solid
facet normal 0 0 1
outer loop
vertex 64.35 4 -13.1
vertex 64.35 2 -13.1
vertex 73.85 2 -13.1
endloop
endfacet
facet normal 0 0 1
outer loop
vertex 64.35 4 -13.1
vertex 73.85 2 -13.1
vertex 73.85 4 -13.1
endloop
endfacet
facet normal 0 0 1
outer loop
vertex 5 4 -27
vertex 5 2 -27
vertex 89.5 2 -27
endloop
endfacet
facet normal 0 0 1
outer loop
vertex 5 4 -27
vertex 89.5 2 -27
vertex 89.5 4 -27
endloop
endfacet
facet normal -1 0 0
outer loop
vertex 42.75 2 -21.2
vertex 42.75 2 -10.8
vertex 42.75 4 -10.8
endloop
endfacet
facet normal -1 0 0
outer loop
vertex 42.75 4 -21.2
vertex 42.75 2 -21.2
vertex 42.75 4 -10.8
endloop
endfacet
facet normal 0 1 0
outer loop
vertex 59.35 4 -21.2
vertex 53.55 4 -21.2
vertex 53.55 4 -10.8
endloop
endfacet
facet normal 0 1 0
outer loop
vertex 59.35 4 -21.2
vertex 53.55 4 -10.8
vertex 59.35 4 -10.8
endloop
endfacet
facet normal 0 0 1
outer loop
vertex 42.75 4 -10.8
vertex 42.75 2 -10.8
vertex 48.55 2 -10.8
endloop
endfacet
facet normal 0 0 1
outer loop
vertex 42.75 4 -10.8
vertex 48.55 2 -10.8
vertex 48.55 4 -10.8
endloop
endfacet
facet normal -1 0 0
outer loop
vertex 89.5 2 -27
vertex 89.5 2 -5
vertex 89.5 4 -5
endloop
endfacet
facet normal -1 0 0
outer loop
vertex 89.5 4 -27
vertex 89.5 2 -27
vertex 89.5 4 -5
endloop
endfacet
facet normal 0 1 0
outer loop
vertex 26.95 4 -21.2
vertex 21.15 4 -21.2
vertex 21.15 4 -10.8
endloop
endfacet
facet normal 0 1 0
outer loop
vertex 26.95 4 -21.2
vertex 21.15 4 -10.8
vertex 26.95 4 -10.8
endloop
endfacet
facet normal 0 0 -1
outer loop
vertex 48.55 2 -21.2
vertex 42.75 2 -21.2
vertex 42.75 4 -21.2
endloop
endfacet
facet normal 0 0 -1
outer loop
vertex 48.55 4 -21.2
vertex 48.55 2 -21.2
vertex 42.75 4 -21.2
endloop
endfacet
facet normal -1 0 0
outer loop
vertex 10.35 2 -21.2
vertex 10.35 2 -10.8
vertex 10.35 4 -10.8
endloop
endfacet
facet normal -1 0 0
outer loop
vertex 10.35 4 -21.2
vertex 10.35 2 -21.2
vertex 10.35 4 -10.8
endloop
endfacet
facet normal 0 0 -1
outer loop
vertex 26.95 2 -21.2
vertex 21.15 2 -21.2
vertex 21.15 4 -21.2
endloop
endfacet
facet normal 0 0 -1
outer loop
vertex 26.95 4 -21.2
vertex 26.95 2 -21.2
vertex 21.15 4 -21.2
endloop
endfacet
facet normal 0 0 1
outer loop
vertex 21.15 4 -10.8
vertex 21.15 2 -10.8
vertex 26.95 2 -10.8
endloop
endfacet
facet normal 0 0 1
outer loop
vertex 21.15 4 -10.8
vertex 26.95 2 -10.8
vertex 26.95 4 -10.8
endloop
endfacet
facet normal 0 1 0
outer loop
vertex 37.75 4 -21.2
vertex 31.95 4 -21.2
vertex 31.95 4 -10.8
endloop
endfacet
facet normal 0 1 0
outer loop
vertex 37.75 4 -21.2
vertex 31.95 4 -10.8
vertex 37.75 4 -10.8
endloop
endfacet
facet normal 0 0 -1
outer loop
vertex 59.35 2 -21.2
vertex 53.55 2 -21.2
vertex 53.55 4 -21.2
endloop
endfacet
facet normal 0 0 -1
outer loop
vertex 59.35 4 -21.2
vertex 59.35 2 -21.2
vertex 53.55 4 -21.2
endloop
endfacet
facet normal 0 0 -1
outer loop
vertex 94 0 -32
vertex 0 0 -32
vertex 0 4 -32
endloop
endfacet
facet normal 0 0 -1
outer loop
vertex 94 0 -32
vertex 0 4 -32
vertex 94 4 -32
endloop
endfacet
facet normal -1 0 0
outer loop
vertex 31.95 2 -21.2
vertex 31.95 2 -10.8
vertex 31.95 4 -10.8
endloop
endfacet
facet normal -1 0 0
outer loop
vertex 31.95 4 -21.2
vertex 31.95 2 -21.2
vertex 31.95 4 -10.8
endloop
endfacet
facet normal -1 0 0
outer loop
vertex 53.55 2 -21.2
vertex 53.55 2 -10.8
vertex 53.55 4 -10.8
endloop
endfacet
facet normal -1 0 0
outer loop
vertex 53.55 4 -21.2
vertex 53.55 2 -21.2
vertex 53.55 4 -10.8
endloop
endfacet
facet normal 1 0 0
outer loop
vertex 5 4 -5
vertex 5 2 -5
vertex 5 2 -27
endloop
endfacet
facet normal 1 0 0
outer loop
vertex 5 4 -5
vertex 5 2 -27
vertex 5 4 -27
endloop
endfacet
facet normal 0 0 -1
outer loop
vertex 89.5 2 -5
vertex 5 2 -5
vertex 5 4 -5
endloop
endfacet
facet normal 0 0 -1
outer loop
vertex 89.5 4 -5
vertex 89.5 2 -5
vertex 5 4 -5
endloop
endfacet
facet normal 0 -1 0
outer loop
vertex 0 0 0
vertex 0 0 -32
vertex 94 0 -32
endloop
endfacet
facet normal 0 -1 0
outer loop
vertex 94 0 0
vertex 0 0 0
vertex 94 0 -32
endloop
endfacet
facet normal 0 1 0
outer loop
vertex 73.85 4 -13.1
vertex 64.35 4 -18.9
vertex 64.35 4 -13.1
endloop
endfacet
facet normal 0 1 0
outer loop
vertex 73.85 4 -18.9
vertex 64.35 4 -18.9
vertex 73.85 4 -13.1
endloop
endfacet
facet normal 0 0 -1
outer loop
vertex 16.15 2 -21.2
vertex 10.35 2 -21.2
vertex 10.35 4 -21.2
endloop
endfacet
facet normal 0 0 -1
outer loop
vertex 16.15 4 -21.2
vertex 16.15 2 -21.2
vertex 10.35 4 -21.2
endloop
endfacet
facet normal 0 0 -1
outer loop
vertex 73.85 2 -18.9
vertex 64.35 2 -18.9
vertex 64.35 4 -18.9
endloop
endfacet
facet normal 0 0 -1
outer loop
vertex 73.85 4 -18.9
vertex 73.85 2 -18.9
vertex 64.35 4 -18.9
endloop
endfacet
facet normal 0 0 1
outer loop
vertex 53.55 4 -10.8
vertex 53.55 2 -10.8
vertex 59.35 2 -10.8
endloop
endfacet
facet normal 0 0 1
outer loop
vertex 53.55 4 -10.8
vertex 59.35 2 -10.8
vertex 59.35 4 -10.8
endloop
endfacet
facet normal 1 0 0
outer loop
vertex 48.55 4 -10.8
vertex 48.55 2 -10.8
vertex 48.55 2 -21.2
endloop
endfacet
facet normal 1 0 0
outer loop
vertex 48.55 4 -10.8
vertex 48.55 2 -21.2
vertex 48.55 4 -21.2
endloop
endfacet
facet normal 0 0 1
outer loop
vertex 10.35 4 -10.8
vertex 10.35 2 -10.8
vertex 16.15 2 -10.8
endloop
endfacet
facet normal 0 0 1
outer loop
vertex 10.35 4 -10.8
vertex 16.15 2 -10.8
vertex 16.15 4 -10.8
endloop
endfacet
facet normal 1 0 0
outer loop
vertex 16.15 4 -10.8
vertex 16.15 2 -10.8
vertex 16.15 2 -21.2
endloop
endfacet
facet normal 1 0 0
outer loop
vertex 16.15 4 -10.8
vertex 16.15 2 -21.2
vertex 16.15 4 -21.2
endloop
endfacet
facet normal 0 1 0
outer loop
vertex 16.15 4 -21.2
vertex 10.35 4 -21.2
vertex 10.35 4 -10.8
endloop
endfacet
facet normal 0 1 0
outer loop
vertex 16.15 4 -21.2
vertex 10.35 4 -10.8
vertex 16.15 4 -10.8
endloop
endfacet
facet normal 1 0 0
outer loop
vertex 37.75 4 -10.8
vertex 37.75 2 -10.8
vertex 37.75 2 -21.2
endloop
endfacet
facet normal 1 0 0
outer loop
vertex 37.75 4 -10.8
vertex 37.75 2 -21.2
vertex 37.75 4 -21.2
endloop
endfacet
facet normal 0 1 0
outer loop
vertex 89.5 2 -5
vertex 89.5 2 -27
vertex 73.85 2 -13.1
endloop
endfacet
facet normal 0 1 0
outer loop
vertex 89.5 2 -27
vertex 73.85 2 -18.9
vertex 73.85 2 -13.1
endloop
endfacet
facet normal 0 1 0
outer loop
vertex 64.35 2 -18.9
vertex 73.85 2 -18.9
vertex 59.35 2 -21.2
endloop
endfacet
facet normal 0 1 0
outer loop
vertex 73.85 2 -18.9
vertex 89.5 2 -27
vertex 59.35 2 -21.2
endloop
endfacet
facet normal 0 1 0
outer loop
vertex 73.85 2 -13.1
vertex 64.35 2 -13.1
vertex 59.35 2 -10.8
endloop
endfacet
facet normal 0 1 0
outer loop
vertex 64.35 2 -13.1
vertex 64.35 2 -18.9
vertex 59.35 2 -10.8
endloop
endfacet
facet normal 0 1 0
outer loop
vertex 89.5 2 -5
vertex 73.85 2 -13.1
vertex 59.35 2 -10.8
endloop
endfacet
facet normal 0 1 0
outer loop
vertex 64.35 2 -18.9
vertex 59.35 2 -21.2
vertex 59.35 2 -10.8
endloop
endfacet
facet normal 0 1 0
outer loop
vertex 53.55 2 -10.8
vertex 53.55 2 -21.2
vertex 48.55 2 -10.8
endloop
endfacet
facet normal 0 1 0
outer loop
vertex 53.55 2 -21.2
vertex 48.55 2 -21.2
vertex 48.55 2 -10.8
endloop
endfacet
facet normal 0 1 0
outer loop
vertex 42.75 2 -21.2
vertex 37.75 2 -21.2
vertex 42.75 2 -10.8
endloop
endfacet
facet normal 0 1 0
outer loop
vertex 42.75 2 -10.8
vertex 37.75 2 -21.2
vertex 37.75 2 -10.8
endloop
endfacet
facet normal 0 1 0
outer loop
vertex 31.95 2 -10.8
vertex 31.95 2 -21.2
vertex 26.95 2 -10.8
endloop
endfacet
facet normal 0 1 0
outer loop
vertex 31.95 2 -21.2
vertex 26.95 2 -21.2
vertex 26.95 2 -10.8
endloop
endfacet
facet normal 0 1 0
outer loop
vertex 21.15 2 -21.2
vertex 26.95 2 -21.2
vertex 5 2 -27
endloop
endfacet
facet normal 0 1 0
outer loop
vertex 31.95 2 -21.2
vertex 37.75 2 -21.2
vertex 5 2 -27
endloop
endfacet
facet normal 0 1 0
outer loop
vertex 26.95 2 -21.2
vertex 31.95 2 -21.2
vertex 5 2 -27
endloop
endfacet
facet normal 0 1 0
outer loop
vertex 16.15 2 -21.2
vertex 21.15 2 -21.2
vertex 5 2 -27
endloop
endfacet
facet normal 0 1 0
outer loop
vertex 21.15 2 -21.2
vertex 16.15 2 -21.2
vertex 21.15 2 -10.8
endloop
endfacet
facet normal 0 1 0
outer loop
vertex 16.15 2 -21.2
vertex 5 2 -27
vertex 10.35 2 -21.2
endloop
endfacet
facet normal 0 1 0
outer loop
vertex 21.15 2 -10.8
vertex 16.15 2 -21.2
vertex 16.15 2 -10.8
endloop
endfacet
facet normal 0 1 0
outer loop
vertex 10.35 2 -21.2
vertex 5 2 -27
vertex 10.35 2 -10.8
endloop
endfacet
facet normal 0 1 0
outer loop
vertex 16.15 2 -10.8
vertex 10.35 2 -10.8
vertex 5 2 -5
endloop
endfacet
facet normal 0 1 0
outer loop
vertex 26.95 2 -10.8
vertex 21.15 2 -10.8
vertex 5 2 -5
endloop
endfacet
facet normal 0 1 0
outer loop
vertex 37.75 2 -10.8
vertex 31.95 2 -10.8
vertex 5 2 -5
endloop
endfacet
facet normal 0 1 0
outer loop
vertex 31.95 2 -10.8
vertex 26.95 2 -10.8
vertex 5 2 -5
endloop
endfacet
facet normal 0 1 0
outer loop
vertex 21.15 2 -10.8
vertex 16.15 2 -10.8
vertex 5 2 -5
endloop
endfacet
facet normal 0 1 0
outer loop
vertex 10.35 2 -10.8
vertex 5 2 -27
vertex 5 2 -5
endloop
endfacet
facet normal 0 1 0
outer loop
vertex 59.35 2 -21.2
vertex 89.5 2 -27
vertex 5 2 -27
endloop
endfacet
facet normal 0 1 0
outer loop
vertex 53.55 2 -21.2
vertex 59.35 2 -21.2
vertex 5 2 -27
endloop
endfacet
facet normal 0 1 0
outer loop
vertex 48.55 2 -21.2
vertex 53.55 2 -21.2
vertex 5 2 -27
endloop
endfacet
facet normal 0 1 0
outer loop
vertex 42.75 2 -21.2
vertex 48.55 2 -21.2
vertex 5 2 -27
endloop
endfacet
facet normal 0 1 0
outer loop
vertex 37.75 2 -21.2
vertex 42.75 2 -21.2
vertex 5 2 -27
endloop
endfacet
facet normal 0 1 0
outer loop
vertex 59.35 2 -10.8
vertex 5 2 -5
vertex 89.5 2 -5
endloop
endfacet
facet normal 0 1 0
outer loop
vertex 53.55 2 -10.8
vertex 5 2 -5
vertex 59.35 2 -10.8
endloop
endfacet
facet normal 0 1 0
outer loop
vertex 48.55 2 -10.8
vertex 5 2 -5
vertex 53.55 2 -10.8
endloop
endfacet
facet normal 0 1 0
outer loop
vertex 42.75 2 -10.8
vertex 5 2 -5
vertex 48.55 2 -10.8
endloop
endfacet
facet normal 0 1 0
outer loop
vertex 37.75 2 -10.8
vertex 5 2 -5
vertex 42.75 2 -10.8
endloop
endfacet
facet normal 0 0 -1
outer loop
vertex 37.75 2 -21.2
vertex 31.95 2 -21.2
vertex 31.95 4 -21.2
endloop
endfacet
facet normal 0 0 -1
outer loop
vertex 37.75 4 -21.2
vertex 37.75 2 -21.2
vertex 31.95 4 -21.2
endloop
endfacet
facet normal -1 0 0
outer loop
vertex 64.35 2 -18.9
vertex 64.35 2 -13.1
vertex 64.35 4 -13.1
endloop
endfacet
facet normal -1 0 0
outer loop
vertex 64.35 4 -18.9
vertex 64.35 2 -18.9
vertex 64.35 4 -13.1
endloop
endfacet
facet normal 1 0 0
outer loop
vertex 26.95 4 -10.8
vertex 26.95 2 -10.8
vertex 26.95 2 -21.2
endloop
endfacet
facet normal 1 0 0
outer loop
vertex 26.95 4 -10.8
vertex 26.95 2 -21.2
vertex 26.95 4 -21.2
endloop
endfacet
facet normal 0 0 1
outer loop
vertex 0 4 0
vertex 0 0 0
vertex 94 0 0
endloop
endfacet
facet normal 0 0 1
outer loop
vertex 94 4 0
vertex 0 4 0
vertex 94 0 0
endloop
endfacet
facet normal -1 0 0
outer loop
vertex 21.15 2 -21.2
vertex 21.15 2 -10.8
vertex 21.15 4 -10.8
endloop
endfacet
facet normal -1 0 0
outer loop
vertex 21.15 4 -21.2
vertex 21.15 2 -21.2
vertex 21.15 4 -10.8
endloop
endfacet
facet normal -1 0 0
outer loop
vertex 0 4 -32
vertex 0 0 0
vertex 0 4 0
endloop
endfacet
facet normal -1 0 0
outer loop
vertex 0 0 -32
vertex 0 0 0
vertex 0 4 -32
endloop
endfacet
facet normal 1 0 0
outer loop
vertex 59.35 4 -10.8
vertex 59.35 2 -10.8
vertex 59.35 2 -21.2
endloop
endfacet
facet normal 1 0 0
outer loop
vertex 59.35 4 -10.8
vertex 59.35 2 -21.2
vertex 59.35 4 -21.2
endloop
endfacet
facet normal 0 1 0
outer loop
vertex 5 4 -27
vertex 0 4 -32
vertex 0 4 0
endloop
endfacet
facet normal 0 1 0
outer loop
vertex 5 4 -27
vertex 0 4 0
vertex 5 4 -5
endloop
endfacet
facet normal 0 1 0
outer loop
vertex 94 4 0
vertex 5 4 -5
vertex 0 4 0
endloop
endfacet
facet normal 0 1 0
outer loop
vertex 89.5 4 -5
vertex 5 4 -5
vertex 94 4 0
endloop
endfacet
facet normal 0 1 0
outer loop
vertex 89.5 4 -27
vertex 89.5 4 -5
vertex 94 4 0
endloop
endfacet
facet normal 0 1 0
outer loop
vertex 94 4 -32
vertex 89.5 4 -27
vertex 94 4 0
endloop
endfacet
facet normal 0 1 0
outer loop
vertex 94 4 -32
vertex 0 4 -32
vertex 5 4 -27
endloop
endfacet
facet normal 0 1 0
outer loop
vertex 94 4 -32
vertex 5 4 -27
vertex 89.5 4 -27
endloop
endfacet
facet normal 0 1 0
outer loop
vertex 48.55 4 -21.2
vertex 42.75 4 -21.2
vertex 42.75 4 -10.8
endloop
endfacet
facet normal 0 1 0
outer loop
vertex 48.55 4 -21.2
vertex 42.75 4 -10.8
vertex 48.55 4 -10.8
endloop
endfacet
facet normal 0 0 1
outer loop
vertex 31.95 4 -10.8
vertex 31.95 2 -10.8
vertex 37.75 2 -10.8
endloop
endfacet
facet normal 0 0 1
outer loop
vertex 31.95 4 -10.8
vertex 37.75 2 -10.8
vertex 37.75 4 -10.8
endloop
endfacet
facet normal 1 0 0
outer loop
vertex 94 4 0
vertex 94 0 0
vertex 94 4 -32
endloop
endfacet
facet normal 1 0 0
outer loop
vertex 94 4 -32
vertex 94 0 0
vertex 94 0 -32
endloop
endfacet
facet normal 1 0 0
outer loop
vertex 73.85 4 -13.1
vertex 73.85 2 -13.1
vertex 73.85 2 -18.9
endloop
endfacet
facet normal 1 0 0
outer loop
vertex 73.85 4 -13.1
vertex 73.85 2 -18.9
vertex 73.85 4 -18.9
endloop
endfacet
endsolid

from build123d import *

# Parameters (mm, degrees)
SKETCH1_W           = 94
SKETCH1_H           = 32
BOSS_EXTRUDE1_DEPTH = 4
CAVITY1_START       = 5
CAVITY1_OUTLINE_W   = 2
CAVITY1_OUTLINE_H   = 5.8
CAVITY1_DEPTH       = 84.5
CAVITY1_START_2     = 73.85
CAVITY1_2_OUTLINE_W = 2
CAVITY1_2_OUTLINE_H = 10.4
CAVITY1_2_DEPTH     = 15.65
CAVITY1_START_3     = 59.35
CAVITY1_3_OUTLINE_W = 2
CAVITY1_3_OUTLINE_H = 2.3
CAVITY1_3_DEPTH     = 14.5
CAVITY1_4_OUTLINE_W = 2
CAVITY1_4_OUTLINE_H = 10.4
CAVITY1_4_DEPTH     = 5.35
CAVITY1_START_4     = 16.15
CAVITY1_5_OUTLINE_W = 2
CAVITY1_5_OUTLINE_H = 10.4
CAVITY1_5_DEPTH     = 5
CAVITY1_START_5     = 26.95
CAVITY1_6_OUTLINE_W = 2
CAVITY1_6_OUTLINE_H = 10.4
CAVITY1_6_DEPTH     = 5
CAVITY1_START_6     = 37.75
CAVITY1_7_OUTLINE_W = 2
CAVITY1_7_OUTLINE_H = 10.4
CAVITY1_7_DEPTH     = 5
CAVITY1_START_7     = 48.55
CAVITY1_8_OUTLINE_W = 2
CAVITY1_8_OUTLINE_H = 10.4
CAVITY1_8_DEPTH     = 5
CAVITY1_9_OUTLINE_W = 2
CAVITY1_9_OUTLINE_H = 5.8
CAVITY1_9_DEPTH     = 5


# Read off the part's stored shape, not the designer's step: Cavity1
with BuildPart() as part:
    # Sketch1 → Boss-Extrude1 (new body)
    with BuildSketch(Plane(origin=(0, 0, 0), x_dir=(1, 0, 0), z_dir=(0, 1, 0))):
        with Locations((47, 16)):
            Rectangle(SKETCH1_W, SKETCH1_H)
    extrude(amount=BOSS_EXTRUDE1_DEPTH)

    # Cavity1 outline → Cavity1 (cut)
    with BuildSketch(Plane.YZ.offset(CAVITY1_START)):
        with Locations((3, -7.9)):
            Rectangle(CAVITY1_OUTLINE_W, CAVITY1_OUTLINE_H)
        with Locations((3, -24.1)):
            Rectangle(CAVITY1_OUTLINE_W, CAVITY1_OUTLINE_H)
    extrude(amount=CAVITY1_DEPTH, mode=Mode.SUBTRACT)

    # Cavity1 2 outline → Cavity1 2 (cut)
    with BuildSketch(Plane.YZ.offset(CAVITY1_START_2)):
        with Locations((3, -16)):
            Rectangle(CAVITY1_2_OUTLINE_W, CAVITY1_2_OUTLINE_H)
    extrude(amount=CAVITY1_2_DEPTH, mode=Mode.SUBTRACT)

    # Cavity1 3 outline → Cavity1 3 (cut)
    with BuildSketch(Plane.YZ.offset(CAVITY1_START_3)):
        with Locations((3, -11.95)):
            Rectangle(CAVITY1_3_OUTLINE_W, CAVITY1_3_OUTLINE_H)
        with Locations((3, -20.05)):
            Rectangle(CAVITY1_3_OUTLINE_W, CAVITY1_3_OUTLINE_H)
    extrude(amount=CAVITY1_3_DEPTH, mode=Mode.SUBTRACT)

    # Cavity1 4 outline → Cavity1 4 (cut)
    with BuildSketch(Plane.YZ.offset(CAVITY1_START)):
        with Locations((3, -16)):
            Rectangle(CAVITY1_4_OUTLINE_W, CAVITY1_4_OUTLINE_H)
    extrude(amount=CAVITY1_4_DEPTH, mode=Mode.SUBTRACT)

    # Cavity1 5 outline → Cavity1 5 (cut)
    with BuildSketch(Plane.YZ.offset(CAVITY1_START_4)):
        with Locations((3, -16)):
            Rectangle(CAVITY1_5_OUTLINE_W, CAVITY1_5_OUTLINE_H)
    extrude(amount=CAVITY1_5_DEPTH, mode=Mode.SUBTRACT)

    # Cavity1 6 outline → Cavity1 6 (cut)
    with BuildSketch(Plane.YZ.offset(CAVITY1_START_5)):
        with Locations((3, -16)):
            Rectangle(CAVITY1_6_OUTLINE_W, CAVITY1_6_OUTLINE_H)
    extrude(amount=CAVITY1_6_DEPTH, mode=Mode.SUBTRACT)

    # Cavity1 7 outline → Cavity1 7 (cut)
    with BuildSketch(Plane.YZ.offset(CAVITY1_START_6)):
        with Locations((3, -16)):
            Rectangle(CAVITY1_7_OUTLINE_W, CAVITY1_7_OUTLINE_H)
    extrude(amount=CAVITY1_7_DEPTH, mode=Mode.SUBTRACT)

    # Cavity1 8 outline → Cavity1 8 (cut)
    with BuildSketch(Plane.YZ.offset(CAVITY1_START_7)):
        with Locations((3, -16)):
            Rectangle(CAVITY1_8_OUTLINE_W, CAVITY1_8_OUTLINE_H)
    extrude(amount=CAVITY1_8_DEPTH, mode=Mode.SUBTRACT)

    # Cavity1 9 outline → Cavity1 9 (cut)
    with BuildSketch(Plane.YZ.offset(CAVITY1_START_3)):
        with Locations((3, -16)):
            Rectangle(CAVITY1_9_OUTLINE_W, CAVITY1_9_OUTLINE_H)
    extrude(amount=CAVITY1_9_DEPTH, mode=Mode.SUBTRACT)


solid = part.part
